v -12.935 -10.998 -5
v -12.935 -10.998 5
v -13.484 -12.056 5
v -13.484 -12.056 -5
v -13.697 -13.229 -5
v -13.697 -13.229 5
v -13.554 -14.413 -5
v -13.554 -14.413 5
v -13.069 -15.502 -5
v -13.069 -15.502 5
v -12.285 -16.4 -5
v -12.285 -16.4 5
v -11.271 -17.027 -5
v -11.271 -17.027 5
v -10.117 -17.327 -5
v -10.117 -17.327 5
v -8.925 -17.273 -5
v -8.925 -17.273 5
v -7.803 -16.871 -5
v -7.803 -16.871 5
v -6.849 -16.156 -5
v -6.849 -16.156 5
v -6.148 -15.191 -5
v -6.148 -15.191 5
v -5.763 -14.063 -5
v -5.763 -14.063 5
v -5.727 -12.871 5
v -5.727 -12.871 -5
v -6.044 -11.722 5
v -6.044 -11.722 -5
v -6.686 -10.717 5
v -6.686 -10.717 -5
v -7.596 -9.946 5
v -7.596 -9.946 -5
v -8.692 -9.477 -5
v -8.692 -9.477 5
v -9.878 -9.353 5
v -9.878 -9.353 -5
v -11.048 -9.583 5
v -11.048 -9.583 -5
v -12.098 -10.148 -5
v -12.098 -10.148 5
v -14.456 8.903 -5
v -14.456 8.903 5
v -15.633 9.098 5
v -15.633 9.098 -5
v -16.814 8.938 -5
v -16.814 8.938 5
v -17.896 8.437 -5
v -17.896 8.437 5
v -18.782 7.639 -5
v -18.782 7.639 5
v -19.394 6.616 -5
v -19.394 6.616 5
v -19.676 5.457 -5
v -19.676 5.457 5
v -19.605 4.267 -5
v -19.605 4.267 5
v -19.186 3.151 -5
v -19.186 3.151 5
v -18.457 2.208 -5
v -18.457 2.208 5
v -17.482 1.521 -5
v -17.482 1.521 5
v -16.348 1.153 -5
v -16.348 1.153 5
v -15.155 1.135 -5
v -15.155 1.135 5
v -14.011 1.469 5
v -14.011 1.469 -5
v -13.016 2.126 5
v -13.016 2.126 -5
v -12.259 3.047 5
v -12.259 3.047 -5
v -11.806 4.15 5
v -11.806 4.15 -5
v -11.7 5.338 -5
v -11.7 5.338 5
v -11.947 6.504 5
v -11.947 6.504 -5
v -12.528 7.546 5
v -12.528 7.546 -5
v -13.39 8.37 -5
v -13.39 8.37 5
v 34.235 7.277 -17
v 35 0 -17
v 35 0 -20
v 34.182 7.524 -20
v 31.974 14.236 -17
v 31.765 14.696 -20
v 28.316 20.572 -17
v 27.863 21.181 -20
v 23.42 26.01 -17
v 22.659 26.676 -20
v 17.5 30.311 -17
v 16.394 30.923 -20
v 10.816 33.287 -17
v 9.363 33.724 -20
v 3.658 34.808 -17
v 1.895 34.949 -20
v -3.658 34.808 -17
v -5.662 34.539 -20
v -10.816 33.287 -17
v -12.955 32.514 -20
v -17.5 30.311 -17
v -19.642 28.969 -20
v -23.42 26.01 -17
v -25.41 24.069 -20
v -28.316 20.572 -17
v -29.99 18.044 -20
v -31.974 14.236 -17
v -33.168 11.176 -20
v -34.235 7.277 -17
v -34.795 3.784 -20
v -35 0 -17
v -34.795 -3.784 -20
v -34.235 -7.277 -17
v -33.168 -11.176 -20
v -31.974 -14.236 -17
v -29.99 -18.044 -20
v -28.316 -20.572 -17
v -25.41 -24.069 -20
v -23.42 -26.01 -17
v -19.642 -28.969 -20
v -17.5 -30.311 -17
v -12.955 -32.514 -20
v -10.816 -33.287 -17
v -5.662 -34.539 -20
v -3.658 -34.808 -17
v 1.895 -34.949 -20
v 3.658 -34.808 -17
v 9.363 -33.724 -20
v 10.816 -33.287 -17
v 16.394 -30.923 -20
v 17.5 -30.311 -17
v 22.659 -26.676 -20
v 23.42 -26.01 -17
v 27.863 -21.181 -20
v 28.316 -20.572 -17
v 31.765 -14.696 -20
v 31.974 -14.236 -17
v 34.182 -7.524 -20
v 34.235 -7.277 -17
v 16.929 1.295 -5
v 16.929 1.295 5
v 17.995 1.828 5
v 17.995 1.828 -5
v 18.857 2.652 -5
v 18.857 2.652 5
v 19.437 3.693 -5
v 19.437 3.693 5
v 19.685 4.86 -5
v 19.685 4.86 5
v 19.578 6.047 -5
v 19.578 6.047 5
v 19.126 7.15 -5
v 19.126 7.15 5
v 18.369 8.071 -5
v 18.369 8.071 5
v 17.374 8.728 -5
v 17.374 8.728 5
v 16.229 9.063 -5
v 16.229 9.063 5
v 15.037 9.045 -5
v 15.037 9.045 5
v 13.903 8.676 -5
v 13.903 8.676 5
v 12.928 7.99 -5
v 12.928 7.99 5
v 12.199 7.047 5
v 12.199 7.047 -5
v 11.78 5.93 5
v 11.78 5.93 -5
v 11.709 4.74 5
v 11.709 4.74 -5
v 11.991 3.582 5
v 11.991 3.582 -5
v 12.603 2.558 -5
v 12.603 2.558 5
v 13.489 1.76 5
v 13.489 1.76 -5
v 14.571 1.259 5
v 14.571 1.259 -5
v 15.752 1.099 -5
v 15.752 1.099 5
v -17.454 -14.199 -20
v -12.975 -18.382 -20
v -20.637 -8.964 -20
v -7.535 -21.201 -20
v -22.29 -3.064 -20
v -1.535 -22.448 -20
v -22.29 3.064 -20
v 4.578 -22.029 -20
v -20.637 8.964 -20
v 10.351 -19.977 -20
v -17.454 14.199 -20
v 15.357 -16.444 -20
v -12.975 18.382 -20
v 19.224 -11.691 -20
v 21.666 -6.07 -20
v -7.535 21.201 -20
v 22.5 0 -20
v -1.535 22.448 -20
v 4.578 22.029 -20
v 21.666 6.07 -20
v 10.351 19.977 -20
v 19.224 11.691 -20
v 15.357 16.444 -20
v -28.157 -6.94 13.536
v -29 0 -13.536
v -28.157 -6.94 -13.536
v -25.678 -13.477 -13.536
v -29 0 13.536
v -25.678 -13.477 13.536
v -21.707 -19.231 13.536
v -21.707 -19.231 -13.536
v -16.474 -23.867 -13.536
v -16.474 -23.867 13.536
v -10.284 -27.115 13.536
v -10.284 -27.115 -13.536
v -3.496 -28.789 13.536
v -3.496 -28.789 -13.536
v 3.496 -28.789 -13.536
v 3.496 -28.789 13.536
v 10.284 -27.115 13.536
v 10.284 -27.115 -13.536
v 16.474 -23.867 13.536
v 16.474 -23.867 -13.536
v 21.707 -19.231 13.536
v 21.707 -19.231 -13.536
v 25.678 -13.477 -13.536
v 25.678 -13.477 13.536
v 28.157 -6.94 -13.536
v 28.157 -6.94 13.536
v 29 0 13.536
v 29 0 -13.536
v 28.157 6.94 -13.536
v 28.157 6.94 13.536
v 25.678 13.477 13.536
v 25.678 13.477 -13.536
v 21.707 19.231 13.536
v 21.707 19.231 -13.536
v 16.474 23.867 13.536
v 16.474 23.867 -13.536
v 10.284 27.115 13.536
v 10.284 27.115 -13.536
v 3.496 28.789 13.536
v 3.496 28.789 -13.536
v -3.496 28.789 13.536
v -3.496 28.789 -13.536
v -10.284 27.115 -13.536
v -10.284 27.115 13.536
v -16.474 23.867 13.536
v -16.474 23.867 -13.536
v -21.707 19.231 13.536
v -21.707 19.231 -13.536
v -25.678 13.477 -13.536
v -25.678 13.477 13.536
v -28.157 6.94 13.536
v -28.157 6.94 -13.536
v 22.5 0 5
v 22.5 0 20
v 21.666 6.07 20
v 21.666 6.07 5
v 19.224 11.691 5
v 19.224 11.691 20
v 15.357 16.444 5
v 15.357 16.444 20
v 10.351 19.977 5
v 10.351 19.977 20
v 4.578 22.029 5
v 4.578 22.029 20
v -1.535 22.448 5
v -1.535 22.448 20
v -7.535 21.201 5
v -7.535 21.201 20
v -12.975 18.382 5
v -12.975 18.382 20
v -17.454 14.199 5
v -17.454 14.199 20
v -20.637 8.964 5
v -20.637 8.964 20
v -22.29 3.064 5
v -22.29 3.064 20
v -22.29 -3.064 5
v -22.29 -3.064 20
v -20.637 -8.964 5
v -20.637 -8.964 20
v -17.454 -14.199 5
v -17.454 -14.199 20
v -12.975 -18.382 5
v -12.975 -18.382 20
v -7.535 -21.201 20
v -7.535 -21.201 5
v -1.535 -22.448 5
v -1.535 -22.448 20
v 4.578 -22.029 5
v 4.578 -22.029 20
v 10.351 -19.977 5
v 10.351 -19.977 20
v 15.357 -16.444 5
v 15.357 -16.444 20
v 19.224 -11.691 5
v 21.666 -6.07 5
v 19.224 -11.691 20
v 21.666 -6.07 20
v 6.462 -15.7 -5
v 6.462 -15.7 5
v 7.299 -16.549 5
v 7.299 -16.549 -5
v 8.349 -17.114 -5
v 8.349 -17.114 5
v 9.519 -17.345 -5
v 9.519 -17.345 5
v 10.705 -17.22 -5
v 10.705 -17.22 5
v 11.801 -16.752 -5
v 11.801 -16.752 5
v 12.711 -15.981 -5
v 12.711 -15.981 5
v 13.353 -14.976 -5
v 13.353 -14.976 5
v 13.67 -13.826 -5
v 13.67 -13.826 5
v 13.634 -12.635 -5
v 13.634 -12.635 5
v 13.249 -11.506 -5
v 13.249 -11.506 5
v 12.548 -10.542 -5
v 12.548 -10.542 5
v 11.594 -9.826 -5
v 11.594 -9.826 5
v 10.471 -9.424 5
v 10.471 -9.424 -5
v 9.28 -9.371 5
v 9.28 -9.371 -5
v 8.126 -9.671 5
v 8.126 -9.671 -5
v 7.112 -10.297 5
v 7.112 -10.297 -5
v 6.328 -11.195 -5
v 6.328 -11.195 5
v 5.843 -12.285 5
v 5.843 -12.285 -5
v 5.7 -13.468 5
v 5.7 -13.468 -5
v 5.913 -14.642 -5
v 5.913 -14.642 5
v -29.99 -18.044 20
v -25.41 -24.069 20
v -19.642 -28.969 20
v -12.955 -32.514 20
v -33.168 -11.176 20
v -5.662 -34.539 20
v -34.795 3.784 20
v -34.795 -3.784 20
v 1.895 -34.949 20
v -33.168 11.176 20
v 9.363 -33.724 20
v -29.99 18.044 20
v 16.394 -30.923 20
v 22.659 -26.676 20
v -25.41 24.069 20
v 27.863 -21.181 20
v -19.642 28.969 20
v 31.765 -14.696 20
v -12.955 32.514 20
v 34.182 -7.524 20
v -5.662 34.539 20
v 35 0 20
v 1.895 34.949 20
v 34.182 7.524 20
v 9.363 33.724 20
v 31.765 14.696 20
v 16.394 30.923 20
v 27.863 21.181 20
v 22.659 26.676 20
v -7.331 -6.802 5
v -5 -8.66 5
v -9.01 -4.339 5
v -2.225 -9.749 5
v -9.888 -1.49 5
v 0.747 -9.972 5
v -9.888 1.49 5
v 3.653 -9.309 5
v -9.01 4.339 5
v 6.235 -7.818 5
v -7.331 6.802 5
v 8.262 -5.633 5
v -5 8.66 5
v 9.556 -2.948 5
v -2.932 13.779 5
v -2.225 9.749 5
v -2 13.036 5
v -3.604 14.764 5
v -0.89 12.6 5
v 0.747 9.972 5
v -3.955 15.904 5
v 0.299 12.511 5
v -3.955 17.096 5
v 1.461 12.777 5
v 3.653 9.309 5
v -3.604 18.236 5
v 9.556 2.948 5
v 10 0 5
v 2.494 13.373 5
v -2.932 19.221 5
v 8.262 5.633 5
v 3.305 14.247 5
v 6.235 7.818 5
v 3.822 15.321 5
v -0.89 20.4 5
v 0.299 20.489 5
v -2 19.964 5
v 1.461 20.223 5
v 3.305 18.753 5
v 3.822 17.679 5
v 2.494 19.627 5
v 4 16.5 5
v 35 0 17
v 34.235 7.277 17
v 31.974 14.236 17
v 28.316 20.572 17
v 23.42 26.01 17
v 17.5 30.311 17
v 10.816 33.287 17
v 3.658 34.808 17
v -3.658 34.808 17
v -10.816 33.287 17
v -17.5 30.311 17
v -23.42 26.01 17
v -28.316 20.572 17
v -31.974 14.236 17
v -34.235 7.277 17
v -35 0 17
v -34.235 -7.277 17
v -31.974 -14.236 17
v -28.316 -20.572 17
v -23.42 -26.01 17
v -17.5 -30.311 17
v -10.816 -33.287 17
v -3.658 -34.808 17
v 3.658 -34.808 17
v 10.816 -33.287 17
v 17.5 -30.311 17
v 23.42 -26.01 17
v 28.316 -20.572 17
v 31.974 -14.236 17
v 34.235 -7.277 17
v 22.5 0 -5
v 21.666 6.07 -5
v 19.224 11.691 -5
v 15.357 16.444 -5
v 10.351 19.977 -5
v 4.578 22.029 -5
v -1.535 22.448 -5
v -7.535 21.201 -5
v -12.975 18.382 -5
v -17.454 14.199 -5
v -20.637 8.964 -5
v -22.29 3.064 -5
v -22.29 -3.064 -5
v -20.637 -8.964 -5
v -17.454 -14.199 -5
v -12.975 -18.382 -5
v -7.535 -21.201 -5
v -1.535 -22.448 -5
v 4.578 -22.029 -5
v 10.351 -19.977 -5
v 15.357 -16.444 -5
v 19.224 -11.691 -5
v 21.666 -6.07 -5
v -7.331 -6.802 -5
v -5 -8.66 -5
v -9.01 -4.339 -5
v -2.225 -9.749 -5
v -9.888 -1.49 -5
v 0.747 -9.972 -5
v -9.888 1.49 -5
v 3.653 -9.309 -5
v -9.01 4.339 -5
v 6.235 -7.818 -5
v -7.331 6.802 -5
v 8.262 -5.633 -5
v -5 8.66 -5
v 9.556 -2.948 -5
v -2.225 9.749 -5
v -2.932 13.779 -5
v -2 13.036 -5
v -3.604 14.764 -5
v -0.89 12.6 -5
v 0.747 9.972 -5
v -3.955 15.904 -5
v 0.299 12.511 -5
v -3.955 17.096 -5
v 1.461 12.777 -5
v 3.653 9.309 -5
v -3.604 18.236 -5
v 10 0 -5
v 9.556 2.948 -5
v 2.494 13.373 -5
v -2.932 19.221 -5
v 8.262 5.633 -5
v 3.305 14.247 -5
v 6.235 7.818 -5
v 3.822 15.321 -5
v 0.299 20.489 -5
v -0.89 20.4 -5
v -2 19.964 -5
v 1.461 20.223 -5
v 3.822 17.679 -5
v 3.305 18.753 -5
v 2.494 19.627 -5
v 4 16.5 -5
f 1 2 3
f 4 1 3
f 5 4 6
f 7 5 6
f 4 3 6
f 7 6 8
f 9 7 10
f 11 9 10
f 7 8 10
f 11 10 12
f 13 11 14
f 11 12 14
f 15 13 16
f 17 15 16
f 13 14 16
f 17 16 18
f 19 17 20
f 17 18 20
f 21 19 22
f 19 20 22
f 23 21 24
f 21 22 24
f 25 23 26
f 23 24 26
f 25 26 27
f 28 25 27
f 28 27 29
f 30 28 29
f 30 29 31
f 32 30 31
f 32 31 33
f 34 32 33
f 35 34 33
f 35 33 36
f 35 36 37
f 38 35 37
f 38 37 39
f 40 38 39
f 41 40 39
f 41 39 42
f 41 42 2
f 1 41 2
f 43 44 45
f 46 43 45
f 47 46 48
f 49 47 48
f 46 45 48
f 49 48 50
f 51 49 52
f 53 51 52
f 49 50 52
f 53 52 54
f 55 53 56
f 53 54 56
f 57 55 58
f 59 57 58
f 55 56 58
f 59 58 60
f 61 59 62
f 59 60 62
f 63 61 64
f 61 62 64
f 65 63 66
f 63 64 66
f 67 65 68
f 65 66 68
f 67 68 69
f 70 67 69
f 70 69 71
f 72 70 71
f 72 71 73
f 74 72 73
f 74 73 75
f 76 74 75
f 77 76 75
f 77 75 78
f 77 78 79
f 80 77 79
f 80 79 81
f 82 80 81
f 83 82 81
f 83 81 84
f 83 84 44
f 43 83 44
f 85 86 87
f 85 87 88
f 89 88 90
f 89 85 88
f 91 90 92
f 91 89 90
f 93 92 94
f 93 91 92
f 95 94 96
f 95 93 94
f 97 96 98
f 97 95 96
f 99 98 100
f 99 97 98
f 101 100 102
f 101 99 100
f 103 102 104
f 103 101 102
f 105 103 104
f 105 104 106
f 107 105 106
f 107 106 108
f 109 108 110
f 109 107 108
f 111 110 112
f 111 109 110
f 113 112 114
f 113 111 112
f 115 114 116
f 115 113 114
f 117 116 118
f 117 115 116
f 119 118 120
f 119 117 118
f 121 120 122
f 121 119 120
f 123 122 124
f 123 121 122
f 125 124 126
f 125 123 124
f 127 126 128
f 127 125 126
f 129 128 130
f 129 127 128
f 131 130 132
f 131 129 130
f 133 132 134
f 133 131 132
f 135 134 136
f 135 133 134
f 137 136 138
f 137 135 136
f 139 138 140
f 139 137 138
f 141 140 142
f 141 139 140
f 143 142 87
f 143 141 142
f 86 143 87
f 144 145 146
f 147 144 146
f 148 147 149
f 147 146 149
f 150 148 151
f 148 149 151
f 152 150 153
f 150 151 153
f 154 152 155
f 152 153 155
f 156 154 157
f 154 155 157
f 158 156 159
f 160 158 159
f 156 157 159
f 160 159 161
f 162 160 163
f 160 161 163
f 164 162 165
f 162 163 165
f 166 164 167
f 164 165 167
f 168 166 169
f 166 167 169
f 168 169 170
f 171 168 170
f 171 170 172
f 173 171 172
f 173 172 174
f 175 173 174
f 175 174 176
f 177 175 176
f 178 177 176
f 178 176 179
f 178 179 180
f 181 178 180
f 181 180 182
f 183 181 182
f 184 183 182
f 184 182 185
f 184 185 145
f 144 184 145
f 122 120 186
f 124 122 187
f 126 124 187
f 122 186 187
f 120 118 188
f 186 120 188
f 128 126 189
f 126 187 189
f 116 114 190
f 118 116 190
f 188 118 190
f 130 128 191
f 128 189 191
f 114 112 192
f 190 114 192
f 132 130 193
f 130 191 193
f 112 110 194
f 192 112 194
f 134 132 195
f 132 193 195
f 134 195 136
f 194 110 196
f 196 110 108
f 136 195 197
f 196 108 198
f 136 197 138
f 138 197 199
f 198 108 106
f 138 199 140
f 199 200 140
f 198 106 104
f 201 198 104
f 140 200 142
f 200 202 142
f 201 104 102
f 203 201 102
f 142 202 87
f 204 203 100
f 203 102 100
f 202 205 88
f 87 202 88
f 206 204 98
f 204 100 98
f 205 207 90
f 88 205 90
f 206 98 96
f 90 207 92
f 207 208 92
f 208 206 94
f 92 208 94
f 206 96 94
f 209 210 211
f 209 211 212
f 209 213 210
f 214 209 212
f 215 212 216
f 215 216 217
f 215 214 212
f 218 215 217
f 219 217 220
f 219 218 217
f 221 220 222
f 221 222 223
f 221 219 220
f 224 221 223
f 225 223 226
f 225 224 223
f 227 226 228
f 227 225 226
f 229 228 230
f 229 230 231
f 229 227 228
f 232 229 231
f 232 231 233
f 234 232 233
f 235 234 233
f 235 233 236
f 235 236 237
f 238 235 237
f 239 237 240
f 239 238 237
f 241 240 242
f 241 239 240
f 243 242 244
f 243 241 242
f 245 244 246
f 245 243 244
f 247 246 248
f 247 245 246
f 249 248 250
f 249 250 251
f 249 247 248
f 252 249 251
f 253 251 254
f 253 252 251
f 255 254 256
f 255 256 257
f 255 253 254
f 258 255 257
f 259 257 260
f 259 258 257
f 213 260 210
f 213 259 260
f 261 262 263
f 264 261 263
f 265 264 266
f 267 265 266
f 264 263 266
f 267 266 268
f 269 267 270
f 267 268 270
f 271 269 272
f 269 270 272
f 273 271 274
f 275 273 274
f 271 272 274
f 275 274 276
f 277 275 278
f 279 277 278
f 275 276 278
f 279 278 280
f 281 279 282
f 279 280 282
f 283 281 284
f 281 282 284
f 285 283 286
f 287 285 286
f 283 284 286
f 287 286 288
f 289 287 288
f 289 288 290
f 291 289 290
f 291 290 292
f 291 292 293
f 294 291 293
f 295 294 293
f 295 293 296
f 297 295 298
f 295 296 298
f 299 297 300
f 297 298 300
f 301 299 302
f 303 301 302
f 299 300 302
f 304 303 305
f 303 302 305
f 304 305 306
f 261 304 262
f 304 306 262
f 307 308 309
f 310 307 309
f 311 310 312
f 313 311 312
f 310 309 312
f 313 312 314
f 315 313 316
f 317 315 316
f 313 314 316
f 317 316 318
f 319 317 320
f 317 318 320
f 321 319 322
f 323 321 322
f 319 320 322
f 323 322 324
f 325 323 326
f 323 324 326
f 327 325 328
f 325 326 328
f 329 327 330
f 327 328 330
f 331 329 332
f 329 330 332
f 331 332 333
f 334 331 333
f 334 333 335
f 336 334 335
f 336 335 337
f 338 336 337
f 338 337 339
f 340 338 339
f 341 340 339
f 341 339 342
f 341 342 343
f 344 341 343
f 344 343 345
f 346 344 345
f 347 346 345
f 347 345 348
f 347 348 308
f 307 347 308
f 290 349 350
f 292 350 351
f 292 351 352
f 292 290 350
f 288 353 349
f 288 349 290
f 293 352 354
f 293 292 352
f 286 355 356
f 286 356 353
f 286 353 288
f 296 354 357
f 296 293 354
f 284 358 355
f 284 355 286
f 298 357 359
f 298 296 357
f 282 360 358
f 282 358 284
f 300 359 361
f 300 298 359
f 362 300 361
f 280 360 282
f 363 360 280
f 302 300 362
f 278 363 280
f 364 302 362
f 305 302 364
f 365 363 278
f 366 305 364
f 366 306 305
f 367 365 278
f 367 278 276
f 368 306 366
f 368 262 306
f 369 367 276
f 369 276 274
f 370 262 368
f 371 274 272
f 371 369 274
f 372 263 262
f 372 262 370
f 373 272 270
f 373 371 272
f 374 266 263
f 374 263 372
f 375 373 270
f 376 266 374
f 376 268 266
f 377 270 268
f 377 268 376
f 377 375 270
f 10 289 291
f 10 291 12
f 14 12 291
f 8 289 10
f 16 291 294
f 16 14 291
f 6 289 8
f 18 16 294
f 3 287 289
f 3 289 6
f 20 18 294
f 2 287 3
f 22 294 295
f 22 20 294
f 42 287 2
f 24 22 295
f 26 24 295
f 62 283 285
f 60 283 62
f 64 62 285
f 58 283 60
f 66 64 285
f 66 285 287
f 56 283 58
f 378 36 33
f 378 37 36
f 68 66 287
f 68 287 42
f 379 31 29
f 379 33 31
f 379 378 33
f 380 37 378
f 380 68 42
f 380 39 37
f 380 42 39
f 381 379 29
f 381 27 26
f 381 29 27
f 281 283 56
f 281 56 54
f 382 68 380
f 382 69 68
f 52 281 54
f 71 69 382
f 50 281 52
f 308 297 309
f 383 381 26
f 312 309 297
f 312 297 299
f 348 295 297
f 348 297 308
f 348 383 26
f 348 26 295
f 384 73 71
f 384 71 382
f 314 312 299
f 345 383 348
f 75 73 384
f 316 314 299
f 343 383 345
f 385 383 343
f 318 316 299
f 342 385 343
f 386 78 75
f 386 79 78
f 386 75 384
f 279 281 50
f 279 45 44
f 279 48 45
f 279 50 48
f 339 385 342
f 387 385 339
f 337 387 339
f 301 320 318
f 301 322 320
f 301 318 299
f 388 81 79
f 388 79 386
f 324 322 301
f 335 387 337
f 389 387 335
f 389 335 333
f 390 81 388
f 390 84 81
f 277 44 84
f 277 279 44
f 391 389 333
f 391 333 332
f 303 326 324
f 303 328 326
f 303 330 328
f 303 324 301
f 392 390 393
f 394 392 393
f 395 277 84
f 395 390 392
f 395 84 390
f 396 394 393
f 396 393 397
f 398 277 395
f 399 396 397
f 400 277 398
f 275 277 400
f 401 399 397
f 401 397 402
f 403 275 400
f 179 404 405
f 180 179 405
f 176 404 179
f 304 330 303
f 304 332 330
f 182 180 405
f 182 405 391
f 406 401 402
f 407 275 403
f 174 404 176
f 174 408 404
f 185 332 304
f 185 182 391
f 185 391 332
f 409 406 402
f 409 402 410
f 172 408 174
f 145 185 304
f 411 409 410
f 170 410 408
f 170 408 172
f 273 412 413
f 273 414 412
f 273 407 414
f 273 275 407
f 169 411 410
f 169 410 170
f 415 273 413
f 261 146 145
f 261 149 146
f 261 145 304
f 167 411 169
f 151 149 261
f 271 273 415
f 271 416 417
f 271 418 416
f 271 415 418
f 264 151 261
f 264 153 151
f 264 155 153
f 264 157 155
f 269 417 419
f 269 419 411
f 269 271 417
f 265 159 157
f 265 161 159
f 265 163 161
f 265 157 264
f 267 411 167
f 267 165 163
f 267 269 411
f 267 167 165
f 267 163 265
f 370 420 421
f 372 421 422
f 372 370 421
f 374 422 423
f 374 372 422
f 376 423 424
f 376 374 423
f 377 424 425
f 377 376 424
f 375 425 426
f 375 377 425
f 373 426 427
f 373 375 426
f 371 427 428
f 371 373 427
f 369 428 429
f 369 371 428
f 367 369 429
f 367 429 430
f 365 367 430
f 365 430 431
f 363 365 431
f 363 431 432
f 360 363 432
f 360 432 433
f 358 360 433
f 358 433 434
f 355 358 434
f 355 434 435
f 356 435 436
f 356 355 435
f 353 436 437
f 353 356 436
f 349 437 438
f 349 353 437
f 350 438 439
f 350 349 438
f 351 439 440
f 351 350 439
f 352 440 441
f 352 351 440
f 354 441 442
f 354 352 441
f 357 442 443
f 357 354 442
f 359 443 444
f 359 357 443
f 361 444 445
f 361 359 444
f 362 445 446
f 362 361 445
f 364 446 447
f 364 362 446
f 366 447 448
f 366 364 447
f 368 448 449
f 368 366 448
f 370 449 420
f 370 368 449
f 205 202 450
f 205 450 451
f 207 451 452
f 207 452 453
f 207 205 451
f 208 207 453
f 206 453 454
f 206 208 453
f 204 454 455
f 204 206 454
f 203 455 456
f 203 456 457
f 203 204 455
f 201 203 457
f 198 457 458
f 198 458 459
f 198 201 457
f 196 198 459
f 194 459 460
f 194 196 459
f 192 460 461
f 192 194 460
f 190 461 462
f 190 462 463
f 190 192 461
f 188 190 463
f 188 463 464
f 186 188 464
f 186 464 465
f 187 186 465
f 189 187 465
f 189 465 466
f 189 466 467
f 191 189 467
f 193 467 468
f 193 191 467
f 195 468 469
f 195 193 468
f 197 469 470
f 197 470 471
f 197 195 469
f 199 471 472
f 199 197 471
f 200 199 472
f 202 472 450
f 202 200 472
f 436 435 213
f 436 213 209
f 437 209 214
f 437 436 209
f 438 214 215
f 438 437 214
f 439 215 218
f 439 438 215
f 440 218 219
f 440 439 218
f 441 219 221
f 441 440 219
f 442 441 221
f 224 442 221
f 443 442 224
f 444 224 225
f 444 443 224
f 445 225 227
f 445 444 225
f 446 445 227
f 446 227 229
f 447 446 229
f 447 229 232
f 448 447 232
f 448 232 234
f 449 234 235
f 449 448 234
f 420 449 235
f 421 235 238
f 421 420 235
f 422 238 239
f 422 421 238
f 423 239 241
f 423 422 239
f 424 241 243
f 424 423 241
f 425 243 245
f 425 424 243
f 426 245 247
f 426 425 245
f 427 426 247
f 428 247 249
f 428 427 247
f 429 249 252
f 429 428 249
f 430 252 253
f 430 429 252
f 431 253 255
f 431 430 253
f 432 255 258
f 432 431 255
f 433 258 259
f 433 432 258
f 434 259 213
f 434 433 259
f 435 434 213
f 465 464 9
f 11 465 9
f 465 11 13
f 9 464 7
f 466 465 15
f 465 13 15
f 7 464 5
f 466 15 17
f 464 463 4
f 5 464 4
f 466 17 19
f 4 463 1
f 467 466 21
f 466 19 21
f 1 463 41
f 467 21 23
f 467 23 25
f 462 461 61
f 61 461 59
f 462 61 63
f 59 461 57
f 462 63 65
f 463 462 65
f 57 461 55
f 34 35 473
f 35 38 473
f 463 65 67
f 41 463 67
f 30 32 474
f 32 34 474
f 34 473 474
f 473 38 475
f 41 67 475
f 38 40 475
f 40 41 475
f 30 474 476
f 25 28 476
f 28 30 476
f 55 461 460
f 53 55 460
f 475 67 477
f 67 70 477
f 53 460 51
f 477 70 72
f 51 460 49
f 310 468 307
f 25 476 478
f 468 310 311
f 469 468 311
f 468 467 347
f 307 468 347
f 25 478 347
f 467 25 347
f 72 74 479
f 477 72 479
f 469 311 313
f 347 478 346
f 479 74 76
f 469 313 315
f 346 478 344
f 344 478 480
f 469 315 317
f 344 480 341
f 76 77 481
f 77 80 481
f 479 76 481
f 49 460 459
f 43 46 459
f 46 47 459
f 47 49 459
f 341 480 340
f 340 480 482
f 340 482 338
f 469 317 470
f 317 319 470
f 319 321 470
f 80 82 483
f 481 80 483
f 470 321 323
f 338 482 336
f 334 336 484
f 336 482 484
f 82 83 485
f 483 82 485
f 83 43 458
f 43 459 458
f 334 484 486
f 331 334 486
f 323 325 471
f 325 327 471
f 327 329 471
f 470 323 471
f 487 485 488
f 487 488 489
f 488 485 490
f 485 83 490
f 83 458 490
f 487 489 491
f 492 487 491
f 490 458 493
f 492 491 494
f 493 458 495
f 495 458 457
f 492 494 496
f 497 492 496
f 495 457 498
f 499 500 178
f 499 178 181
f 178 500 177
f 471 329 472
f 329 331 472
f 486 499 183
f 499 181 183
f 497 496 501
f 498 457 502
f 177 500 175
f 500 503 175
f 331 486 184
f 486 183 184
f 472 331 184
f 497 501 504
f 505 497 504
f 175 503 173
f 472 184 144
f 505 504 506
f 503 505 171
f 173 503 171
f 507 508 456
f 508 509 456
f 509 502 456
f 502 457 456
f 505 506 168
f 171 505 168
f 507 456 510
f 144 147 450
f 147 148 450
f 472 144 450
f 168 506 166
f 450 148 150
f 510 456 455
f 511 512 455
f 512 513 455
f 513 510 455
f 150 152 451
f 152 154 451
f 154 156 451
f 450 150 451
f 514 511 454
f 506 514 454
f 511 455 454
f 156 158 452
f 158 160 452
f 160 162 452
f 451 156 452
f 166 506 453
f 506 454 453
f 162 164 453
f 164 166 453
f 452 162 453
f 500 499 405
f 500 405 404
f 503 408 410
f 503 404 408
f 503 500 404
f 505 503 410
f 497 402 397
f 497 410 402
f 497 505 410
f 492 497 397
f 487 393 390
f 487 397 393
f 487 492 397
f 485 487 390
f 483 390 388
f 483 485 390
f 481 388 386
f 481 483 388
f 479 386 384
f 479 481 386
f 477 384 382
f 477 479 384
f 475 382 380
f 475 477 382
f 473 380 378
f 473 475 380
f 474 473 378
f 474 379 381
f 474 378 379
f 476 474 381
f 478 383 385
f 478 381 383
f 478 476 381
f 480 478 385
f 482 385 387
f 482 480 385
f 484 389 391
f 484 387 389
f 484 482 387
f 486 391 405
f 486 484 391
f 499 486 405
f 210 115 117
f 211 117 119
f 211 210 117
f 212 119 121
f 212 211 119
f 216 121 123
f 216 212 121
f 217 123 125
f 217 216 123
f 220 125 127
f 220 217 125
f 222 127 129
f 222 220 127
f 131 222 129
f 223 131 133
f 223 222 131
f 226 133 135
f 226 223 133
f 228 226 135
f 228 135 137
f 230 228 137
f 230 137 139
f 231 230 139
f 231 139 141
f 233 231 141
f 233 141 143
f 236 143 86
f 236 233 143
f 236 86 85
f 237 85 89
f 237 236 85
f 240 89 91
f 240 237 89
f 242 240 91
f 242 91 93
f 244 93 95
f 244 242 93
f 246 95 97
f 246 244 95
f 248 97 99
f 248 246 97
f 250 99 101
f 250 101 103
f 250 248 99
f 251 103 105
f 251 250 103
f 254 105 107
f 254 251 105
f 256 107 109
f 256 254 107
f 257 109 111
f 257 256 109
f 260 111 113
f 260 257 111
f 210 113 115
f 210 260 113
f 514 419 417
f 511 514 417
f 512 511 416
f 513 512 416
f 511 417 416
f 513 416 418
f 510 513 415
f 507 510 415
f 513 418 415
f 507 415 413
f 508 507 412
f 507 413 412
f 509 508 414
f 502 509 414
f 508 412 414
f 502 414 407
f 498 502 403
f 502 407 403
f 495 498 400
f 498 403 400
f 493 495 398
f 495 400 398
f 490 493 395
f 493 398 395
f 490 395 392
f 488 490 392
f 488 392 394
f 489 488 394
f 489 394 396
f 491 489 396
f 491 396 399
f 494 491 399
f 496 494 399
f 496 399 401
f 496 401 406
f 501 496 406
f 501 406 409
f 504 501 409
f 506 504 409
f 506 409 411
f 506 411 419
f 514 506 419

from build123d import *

# Parameters (mm, degrees)
ESQUISSE1_R                  = 35
ESQUISSE1_R_2                = 10
BOSS_EXTRU_1_DEPTH           = 20
ESQUISSE2_R                  = 22.5
ENL_V_MAT_EXTRU_1_DEPTH      = 15
ESQUISSE3_R                  = 4
ENL_V_MAT_EXTRU_2_DEPTH      = 56.452682532
R_P_TITION_CIRCULAIRE1_COUNT = 5


with BuildPart() as part:
    # Esquisse1 → Boss.-Extru.1 (new, symmetric)
    with BuildSketch(Plane.XY):
        Circle(ESQUISSE1_R)
        Circle(ESQUISSE1_R_2, mode=Mode.SUBTRACT)
    extrude(amount=BOSS_EXTRU_1_DEPTH, both=True)

    # Esquisse2 → Enlèv. mat.-Extru.1 (cut)
    with BuildSketch(Plane.XY.offset(20)):
        Circle(ESQUISSE2_R)
    enl_v_mat_extru_1 = extrude(amount=-ENL_V_MAT_EXTRU_1_DEPTH, mode=Mode.SUBTRACT)

    # Symétrie1: Enlèv. mat.-Extru.1 across plane
    add(enl_v_mat_extru_1.mirror(Plane.XY), mode=Mode.SUBTRACT)

    # Esquisse3 → Enlèv. mat.-Extru.2 (cut, through all)
    with BuildSketch(Plane.XY.offset(5)):
        with Locations((0, 16.5)):
            Circle(ESQUISSE3_R)
    enl_v_mat_extru_2 = extrude(amount=-ENL_V_MAT_EXTRU_2_DEPTH, mode=Mode.SUBTRACT)

    # Répétition circulaire1: Enlèv. mat.-Extru.2 ×5 about axis
    r_p_tition_circulaire1_axis = Axis((0, 0, 0), (0, 0, 1))
    for i in range(1, R_P_TITION_CIRCULAIRE1_COUNT):
        add(enl_v_mat_extru_2.rotate(r_p_tition_circulaire1_axis, i * 360 / R_P_TITION_CIRCULAIRE1_COUNT), mode=Mode.SUBTRACT)

    # Esquisse4 → Enlèvement de matière-Révolution1 (revolve, cut)
    with BuildSketch(Plane(origin=(0, 0, 0), x_dir=(1, 0, 0), z_dir=(0, 1, 0)), mode=Mode.PRIVATE) as enl_vement_de_mati_re_r_volution1_sk:
        Polygon((35, 17), (29, 13.535898385), (29, -13.535898385), (35, -17), align=None)
    revolve(enl_vement_de_mati_re_r_volution1_sk.sketch.rotate(Axis((0, 0, -37.926889672), (0, 0, 1)), 180), axis=Axis((0, 0, -37.926889672), (0, 0, 1)), mode=Mode.SUBTRACT)


solid = part.part
